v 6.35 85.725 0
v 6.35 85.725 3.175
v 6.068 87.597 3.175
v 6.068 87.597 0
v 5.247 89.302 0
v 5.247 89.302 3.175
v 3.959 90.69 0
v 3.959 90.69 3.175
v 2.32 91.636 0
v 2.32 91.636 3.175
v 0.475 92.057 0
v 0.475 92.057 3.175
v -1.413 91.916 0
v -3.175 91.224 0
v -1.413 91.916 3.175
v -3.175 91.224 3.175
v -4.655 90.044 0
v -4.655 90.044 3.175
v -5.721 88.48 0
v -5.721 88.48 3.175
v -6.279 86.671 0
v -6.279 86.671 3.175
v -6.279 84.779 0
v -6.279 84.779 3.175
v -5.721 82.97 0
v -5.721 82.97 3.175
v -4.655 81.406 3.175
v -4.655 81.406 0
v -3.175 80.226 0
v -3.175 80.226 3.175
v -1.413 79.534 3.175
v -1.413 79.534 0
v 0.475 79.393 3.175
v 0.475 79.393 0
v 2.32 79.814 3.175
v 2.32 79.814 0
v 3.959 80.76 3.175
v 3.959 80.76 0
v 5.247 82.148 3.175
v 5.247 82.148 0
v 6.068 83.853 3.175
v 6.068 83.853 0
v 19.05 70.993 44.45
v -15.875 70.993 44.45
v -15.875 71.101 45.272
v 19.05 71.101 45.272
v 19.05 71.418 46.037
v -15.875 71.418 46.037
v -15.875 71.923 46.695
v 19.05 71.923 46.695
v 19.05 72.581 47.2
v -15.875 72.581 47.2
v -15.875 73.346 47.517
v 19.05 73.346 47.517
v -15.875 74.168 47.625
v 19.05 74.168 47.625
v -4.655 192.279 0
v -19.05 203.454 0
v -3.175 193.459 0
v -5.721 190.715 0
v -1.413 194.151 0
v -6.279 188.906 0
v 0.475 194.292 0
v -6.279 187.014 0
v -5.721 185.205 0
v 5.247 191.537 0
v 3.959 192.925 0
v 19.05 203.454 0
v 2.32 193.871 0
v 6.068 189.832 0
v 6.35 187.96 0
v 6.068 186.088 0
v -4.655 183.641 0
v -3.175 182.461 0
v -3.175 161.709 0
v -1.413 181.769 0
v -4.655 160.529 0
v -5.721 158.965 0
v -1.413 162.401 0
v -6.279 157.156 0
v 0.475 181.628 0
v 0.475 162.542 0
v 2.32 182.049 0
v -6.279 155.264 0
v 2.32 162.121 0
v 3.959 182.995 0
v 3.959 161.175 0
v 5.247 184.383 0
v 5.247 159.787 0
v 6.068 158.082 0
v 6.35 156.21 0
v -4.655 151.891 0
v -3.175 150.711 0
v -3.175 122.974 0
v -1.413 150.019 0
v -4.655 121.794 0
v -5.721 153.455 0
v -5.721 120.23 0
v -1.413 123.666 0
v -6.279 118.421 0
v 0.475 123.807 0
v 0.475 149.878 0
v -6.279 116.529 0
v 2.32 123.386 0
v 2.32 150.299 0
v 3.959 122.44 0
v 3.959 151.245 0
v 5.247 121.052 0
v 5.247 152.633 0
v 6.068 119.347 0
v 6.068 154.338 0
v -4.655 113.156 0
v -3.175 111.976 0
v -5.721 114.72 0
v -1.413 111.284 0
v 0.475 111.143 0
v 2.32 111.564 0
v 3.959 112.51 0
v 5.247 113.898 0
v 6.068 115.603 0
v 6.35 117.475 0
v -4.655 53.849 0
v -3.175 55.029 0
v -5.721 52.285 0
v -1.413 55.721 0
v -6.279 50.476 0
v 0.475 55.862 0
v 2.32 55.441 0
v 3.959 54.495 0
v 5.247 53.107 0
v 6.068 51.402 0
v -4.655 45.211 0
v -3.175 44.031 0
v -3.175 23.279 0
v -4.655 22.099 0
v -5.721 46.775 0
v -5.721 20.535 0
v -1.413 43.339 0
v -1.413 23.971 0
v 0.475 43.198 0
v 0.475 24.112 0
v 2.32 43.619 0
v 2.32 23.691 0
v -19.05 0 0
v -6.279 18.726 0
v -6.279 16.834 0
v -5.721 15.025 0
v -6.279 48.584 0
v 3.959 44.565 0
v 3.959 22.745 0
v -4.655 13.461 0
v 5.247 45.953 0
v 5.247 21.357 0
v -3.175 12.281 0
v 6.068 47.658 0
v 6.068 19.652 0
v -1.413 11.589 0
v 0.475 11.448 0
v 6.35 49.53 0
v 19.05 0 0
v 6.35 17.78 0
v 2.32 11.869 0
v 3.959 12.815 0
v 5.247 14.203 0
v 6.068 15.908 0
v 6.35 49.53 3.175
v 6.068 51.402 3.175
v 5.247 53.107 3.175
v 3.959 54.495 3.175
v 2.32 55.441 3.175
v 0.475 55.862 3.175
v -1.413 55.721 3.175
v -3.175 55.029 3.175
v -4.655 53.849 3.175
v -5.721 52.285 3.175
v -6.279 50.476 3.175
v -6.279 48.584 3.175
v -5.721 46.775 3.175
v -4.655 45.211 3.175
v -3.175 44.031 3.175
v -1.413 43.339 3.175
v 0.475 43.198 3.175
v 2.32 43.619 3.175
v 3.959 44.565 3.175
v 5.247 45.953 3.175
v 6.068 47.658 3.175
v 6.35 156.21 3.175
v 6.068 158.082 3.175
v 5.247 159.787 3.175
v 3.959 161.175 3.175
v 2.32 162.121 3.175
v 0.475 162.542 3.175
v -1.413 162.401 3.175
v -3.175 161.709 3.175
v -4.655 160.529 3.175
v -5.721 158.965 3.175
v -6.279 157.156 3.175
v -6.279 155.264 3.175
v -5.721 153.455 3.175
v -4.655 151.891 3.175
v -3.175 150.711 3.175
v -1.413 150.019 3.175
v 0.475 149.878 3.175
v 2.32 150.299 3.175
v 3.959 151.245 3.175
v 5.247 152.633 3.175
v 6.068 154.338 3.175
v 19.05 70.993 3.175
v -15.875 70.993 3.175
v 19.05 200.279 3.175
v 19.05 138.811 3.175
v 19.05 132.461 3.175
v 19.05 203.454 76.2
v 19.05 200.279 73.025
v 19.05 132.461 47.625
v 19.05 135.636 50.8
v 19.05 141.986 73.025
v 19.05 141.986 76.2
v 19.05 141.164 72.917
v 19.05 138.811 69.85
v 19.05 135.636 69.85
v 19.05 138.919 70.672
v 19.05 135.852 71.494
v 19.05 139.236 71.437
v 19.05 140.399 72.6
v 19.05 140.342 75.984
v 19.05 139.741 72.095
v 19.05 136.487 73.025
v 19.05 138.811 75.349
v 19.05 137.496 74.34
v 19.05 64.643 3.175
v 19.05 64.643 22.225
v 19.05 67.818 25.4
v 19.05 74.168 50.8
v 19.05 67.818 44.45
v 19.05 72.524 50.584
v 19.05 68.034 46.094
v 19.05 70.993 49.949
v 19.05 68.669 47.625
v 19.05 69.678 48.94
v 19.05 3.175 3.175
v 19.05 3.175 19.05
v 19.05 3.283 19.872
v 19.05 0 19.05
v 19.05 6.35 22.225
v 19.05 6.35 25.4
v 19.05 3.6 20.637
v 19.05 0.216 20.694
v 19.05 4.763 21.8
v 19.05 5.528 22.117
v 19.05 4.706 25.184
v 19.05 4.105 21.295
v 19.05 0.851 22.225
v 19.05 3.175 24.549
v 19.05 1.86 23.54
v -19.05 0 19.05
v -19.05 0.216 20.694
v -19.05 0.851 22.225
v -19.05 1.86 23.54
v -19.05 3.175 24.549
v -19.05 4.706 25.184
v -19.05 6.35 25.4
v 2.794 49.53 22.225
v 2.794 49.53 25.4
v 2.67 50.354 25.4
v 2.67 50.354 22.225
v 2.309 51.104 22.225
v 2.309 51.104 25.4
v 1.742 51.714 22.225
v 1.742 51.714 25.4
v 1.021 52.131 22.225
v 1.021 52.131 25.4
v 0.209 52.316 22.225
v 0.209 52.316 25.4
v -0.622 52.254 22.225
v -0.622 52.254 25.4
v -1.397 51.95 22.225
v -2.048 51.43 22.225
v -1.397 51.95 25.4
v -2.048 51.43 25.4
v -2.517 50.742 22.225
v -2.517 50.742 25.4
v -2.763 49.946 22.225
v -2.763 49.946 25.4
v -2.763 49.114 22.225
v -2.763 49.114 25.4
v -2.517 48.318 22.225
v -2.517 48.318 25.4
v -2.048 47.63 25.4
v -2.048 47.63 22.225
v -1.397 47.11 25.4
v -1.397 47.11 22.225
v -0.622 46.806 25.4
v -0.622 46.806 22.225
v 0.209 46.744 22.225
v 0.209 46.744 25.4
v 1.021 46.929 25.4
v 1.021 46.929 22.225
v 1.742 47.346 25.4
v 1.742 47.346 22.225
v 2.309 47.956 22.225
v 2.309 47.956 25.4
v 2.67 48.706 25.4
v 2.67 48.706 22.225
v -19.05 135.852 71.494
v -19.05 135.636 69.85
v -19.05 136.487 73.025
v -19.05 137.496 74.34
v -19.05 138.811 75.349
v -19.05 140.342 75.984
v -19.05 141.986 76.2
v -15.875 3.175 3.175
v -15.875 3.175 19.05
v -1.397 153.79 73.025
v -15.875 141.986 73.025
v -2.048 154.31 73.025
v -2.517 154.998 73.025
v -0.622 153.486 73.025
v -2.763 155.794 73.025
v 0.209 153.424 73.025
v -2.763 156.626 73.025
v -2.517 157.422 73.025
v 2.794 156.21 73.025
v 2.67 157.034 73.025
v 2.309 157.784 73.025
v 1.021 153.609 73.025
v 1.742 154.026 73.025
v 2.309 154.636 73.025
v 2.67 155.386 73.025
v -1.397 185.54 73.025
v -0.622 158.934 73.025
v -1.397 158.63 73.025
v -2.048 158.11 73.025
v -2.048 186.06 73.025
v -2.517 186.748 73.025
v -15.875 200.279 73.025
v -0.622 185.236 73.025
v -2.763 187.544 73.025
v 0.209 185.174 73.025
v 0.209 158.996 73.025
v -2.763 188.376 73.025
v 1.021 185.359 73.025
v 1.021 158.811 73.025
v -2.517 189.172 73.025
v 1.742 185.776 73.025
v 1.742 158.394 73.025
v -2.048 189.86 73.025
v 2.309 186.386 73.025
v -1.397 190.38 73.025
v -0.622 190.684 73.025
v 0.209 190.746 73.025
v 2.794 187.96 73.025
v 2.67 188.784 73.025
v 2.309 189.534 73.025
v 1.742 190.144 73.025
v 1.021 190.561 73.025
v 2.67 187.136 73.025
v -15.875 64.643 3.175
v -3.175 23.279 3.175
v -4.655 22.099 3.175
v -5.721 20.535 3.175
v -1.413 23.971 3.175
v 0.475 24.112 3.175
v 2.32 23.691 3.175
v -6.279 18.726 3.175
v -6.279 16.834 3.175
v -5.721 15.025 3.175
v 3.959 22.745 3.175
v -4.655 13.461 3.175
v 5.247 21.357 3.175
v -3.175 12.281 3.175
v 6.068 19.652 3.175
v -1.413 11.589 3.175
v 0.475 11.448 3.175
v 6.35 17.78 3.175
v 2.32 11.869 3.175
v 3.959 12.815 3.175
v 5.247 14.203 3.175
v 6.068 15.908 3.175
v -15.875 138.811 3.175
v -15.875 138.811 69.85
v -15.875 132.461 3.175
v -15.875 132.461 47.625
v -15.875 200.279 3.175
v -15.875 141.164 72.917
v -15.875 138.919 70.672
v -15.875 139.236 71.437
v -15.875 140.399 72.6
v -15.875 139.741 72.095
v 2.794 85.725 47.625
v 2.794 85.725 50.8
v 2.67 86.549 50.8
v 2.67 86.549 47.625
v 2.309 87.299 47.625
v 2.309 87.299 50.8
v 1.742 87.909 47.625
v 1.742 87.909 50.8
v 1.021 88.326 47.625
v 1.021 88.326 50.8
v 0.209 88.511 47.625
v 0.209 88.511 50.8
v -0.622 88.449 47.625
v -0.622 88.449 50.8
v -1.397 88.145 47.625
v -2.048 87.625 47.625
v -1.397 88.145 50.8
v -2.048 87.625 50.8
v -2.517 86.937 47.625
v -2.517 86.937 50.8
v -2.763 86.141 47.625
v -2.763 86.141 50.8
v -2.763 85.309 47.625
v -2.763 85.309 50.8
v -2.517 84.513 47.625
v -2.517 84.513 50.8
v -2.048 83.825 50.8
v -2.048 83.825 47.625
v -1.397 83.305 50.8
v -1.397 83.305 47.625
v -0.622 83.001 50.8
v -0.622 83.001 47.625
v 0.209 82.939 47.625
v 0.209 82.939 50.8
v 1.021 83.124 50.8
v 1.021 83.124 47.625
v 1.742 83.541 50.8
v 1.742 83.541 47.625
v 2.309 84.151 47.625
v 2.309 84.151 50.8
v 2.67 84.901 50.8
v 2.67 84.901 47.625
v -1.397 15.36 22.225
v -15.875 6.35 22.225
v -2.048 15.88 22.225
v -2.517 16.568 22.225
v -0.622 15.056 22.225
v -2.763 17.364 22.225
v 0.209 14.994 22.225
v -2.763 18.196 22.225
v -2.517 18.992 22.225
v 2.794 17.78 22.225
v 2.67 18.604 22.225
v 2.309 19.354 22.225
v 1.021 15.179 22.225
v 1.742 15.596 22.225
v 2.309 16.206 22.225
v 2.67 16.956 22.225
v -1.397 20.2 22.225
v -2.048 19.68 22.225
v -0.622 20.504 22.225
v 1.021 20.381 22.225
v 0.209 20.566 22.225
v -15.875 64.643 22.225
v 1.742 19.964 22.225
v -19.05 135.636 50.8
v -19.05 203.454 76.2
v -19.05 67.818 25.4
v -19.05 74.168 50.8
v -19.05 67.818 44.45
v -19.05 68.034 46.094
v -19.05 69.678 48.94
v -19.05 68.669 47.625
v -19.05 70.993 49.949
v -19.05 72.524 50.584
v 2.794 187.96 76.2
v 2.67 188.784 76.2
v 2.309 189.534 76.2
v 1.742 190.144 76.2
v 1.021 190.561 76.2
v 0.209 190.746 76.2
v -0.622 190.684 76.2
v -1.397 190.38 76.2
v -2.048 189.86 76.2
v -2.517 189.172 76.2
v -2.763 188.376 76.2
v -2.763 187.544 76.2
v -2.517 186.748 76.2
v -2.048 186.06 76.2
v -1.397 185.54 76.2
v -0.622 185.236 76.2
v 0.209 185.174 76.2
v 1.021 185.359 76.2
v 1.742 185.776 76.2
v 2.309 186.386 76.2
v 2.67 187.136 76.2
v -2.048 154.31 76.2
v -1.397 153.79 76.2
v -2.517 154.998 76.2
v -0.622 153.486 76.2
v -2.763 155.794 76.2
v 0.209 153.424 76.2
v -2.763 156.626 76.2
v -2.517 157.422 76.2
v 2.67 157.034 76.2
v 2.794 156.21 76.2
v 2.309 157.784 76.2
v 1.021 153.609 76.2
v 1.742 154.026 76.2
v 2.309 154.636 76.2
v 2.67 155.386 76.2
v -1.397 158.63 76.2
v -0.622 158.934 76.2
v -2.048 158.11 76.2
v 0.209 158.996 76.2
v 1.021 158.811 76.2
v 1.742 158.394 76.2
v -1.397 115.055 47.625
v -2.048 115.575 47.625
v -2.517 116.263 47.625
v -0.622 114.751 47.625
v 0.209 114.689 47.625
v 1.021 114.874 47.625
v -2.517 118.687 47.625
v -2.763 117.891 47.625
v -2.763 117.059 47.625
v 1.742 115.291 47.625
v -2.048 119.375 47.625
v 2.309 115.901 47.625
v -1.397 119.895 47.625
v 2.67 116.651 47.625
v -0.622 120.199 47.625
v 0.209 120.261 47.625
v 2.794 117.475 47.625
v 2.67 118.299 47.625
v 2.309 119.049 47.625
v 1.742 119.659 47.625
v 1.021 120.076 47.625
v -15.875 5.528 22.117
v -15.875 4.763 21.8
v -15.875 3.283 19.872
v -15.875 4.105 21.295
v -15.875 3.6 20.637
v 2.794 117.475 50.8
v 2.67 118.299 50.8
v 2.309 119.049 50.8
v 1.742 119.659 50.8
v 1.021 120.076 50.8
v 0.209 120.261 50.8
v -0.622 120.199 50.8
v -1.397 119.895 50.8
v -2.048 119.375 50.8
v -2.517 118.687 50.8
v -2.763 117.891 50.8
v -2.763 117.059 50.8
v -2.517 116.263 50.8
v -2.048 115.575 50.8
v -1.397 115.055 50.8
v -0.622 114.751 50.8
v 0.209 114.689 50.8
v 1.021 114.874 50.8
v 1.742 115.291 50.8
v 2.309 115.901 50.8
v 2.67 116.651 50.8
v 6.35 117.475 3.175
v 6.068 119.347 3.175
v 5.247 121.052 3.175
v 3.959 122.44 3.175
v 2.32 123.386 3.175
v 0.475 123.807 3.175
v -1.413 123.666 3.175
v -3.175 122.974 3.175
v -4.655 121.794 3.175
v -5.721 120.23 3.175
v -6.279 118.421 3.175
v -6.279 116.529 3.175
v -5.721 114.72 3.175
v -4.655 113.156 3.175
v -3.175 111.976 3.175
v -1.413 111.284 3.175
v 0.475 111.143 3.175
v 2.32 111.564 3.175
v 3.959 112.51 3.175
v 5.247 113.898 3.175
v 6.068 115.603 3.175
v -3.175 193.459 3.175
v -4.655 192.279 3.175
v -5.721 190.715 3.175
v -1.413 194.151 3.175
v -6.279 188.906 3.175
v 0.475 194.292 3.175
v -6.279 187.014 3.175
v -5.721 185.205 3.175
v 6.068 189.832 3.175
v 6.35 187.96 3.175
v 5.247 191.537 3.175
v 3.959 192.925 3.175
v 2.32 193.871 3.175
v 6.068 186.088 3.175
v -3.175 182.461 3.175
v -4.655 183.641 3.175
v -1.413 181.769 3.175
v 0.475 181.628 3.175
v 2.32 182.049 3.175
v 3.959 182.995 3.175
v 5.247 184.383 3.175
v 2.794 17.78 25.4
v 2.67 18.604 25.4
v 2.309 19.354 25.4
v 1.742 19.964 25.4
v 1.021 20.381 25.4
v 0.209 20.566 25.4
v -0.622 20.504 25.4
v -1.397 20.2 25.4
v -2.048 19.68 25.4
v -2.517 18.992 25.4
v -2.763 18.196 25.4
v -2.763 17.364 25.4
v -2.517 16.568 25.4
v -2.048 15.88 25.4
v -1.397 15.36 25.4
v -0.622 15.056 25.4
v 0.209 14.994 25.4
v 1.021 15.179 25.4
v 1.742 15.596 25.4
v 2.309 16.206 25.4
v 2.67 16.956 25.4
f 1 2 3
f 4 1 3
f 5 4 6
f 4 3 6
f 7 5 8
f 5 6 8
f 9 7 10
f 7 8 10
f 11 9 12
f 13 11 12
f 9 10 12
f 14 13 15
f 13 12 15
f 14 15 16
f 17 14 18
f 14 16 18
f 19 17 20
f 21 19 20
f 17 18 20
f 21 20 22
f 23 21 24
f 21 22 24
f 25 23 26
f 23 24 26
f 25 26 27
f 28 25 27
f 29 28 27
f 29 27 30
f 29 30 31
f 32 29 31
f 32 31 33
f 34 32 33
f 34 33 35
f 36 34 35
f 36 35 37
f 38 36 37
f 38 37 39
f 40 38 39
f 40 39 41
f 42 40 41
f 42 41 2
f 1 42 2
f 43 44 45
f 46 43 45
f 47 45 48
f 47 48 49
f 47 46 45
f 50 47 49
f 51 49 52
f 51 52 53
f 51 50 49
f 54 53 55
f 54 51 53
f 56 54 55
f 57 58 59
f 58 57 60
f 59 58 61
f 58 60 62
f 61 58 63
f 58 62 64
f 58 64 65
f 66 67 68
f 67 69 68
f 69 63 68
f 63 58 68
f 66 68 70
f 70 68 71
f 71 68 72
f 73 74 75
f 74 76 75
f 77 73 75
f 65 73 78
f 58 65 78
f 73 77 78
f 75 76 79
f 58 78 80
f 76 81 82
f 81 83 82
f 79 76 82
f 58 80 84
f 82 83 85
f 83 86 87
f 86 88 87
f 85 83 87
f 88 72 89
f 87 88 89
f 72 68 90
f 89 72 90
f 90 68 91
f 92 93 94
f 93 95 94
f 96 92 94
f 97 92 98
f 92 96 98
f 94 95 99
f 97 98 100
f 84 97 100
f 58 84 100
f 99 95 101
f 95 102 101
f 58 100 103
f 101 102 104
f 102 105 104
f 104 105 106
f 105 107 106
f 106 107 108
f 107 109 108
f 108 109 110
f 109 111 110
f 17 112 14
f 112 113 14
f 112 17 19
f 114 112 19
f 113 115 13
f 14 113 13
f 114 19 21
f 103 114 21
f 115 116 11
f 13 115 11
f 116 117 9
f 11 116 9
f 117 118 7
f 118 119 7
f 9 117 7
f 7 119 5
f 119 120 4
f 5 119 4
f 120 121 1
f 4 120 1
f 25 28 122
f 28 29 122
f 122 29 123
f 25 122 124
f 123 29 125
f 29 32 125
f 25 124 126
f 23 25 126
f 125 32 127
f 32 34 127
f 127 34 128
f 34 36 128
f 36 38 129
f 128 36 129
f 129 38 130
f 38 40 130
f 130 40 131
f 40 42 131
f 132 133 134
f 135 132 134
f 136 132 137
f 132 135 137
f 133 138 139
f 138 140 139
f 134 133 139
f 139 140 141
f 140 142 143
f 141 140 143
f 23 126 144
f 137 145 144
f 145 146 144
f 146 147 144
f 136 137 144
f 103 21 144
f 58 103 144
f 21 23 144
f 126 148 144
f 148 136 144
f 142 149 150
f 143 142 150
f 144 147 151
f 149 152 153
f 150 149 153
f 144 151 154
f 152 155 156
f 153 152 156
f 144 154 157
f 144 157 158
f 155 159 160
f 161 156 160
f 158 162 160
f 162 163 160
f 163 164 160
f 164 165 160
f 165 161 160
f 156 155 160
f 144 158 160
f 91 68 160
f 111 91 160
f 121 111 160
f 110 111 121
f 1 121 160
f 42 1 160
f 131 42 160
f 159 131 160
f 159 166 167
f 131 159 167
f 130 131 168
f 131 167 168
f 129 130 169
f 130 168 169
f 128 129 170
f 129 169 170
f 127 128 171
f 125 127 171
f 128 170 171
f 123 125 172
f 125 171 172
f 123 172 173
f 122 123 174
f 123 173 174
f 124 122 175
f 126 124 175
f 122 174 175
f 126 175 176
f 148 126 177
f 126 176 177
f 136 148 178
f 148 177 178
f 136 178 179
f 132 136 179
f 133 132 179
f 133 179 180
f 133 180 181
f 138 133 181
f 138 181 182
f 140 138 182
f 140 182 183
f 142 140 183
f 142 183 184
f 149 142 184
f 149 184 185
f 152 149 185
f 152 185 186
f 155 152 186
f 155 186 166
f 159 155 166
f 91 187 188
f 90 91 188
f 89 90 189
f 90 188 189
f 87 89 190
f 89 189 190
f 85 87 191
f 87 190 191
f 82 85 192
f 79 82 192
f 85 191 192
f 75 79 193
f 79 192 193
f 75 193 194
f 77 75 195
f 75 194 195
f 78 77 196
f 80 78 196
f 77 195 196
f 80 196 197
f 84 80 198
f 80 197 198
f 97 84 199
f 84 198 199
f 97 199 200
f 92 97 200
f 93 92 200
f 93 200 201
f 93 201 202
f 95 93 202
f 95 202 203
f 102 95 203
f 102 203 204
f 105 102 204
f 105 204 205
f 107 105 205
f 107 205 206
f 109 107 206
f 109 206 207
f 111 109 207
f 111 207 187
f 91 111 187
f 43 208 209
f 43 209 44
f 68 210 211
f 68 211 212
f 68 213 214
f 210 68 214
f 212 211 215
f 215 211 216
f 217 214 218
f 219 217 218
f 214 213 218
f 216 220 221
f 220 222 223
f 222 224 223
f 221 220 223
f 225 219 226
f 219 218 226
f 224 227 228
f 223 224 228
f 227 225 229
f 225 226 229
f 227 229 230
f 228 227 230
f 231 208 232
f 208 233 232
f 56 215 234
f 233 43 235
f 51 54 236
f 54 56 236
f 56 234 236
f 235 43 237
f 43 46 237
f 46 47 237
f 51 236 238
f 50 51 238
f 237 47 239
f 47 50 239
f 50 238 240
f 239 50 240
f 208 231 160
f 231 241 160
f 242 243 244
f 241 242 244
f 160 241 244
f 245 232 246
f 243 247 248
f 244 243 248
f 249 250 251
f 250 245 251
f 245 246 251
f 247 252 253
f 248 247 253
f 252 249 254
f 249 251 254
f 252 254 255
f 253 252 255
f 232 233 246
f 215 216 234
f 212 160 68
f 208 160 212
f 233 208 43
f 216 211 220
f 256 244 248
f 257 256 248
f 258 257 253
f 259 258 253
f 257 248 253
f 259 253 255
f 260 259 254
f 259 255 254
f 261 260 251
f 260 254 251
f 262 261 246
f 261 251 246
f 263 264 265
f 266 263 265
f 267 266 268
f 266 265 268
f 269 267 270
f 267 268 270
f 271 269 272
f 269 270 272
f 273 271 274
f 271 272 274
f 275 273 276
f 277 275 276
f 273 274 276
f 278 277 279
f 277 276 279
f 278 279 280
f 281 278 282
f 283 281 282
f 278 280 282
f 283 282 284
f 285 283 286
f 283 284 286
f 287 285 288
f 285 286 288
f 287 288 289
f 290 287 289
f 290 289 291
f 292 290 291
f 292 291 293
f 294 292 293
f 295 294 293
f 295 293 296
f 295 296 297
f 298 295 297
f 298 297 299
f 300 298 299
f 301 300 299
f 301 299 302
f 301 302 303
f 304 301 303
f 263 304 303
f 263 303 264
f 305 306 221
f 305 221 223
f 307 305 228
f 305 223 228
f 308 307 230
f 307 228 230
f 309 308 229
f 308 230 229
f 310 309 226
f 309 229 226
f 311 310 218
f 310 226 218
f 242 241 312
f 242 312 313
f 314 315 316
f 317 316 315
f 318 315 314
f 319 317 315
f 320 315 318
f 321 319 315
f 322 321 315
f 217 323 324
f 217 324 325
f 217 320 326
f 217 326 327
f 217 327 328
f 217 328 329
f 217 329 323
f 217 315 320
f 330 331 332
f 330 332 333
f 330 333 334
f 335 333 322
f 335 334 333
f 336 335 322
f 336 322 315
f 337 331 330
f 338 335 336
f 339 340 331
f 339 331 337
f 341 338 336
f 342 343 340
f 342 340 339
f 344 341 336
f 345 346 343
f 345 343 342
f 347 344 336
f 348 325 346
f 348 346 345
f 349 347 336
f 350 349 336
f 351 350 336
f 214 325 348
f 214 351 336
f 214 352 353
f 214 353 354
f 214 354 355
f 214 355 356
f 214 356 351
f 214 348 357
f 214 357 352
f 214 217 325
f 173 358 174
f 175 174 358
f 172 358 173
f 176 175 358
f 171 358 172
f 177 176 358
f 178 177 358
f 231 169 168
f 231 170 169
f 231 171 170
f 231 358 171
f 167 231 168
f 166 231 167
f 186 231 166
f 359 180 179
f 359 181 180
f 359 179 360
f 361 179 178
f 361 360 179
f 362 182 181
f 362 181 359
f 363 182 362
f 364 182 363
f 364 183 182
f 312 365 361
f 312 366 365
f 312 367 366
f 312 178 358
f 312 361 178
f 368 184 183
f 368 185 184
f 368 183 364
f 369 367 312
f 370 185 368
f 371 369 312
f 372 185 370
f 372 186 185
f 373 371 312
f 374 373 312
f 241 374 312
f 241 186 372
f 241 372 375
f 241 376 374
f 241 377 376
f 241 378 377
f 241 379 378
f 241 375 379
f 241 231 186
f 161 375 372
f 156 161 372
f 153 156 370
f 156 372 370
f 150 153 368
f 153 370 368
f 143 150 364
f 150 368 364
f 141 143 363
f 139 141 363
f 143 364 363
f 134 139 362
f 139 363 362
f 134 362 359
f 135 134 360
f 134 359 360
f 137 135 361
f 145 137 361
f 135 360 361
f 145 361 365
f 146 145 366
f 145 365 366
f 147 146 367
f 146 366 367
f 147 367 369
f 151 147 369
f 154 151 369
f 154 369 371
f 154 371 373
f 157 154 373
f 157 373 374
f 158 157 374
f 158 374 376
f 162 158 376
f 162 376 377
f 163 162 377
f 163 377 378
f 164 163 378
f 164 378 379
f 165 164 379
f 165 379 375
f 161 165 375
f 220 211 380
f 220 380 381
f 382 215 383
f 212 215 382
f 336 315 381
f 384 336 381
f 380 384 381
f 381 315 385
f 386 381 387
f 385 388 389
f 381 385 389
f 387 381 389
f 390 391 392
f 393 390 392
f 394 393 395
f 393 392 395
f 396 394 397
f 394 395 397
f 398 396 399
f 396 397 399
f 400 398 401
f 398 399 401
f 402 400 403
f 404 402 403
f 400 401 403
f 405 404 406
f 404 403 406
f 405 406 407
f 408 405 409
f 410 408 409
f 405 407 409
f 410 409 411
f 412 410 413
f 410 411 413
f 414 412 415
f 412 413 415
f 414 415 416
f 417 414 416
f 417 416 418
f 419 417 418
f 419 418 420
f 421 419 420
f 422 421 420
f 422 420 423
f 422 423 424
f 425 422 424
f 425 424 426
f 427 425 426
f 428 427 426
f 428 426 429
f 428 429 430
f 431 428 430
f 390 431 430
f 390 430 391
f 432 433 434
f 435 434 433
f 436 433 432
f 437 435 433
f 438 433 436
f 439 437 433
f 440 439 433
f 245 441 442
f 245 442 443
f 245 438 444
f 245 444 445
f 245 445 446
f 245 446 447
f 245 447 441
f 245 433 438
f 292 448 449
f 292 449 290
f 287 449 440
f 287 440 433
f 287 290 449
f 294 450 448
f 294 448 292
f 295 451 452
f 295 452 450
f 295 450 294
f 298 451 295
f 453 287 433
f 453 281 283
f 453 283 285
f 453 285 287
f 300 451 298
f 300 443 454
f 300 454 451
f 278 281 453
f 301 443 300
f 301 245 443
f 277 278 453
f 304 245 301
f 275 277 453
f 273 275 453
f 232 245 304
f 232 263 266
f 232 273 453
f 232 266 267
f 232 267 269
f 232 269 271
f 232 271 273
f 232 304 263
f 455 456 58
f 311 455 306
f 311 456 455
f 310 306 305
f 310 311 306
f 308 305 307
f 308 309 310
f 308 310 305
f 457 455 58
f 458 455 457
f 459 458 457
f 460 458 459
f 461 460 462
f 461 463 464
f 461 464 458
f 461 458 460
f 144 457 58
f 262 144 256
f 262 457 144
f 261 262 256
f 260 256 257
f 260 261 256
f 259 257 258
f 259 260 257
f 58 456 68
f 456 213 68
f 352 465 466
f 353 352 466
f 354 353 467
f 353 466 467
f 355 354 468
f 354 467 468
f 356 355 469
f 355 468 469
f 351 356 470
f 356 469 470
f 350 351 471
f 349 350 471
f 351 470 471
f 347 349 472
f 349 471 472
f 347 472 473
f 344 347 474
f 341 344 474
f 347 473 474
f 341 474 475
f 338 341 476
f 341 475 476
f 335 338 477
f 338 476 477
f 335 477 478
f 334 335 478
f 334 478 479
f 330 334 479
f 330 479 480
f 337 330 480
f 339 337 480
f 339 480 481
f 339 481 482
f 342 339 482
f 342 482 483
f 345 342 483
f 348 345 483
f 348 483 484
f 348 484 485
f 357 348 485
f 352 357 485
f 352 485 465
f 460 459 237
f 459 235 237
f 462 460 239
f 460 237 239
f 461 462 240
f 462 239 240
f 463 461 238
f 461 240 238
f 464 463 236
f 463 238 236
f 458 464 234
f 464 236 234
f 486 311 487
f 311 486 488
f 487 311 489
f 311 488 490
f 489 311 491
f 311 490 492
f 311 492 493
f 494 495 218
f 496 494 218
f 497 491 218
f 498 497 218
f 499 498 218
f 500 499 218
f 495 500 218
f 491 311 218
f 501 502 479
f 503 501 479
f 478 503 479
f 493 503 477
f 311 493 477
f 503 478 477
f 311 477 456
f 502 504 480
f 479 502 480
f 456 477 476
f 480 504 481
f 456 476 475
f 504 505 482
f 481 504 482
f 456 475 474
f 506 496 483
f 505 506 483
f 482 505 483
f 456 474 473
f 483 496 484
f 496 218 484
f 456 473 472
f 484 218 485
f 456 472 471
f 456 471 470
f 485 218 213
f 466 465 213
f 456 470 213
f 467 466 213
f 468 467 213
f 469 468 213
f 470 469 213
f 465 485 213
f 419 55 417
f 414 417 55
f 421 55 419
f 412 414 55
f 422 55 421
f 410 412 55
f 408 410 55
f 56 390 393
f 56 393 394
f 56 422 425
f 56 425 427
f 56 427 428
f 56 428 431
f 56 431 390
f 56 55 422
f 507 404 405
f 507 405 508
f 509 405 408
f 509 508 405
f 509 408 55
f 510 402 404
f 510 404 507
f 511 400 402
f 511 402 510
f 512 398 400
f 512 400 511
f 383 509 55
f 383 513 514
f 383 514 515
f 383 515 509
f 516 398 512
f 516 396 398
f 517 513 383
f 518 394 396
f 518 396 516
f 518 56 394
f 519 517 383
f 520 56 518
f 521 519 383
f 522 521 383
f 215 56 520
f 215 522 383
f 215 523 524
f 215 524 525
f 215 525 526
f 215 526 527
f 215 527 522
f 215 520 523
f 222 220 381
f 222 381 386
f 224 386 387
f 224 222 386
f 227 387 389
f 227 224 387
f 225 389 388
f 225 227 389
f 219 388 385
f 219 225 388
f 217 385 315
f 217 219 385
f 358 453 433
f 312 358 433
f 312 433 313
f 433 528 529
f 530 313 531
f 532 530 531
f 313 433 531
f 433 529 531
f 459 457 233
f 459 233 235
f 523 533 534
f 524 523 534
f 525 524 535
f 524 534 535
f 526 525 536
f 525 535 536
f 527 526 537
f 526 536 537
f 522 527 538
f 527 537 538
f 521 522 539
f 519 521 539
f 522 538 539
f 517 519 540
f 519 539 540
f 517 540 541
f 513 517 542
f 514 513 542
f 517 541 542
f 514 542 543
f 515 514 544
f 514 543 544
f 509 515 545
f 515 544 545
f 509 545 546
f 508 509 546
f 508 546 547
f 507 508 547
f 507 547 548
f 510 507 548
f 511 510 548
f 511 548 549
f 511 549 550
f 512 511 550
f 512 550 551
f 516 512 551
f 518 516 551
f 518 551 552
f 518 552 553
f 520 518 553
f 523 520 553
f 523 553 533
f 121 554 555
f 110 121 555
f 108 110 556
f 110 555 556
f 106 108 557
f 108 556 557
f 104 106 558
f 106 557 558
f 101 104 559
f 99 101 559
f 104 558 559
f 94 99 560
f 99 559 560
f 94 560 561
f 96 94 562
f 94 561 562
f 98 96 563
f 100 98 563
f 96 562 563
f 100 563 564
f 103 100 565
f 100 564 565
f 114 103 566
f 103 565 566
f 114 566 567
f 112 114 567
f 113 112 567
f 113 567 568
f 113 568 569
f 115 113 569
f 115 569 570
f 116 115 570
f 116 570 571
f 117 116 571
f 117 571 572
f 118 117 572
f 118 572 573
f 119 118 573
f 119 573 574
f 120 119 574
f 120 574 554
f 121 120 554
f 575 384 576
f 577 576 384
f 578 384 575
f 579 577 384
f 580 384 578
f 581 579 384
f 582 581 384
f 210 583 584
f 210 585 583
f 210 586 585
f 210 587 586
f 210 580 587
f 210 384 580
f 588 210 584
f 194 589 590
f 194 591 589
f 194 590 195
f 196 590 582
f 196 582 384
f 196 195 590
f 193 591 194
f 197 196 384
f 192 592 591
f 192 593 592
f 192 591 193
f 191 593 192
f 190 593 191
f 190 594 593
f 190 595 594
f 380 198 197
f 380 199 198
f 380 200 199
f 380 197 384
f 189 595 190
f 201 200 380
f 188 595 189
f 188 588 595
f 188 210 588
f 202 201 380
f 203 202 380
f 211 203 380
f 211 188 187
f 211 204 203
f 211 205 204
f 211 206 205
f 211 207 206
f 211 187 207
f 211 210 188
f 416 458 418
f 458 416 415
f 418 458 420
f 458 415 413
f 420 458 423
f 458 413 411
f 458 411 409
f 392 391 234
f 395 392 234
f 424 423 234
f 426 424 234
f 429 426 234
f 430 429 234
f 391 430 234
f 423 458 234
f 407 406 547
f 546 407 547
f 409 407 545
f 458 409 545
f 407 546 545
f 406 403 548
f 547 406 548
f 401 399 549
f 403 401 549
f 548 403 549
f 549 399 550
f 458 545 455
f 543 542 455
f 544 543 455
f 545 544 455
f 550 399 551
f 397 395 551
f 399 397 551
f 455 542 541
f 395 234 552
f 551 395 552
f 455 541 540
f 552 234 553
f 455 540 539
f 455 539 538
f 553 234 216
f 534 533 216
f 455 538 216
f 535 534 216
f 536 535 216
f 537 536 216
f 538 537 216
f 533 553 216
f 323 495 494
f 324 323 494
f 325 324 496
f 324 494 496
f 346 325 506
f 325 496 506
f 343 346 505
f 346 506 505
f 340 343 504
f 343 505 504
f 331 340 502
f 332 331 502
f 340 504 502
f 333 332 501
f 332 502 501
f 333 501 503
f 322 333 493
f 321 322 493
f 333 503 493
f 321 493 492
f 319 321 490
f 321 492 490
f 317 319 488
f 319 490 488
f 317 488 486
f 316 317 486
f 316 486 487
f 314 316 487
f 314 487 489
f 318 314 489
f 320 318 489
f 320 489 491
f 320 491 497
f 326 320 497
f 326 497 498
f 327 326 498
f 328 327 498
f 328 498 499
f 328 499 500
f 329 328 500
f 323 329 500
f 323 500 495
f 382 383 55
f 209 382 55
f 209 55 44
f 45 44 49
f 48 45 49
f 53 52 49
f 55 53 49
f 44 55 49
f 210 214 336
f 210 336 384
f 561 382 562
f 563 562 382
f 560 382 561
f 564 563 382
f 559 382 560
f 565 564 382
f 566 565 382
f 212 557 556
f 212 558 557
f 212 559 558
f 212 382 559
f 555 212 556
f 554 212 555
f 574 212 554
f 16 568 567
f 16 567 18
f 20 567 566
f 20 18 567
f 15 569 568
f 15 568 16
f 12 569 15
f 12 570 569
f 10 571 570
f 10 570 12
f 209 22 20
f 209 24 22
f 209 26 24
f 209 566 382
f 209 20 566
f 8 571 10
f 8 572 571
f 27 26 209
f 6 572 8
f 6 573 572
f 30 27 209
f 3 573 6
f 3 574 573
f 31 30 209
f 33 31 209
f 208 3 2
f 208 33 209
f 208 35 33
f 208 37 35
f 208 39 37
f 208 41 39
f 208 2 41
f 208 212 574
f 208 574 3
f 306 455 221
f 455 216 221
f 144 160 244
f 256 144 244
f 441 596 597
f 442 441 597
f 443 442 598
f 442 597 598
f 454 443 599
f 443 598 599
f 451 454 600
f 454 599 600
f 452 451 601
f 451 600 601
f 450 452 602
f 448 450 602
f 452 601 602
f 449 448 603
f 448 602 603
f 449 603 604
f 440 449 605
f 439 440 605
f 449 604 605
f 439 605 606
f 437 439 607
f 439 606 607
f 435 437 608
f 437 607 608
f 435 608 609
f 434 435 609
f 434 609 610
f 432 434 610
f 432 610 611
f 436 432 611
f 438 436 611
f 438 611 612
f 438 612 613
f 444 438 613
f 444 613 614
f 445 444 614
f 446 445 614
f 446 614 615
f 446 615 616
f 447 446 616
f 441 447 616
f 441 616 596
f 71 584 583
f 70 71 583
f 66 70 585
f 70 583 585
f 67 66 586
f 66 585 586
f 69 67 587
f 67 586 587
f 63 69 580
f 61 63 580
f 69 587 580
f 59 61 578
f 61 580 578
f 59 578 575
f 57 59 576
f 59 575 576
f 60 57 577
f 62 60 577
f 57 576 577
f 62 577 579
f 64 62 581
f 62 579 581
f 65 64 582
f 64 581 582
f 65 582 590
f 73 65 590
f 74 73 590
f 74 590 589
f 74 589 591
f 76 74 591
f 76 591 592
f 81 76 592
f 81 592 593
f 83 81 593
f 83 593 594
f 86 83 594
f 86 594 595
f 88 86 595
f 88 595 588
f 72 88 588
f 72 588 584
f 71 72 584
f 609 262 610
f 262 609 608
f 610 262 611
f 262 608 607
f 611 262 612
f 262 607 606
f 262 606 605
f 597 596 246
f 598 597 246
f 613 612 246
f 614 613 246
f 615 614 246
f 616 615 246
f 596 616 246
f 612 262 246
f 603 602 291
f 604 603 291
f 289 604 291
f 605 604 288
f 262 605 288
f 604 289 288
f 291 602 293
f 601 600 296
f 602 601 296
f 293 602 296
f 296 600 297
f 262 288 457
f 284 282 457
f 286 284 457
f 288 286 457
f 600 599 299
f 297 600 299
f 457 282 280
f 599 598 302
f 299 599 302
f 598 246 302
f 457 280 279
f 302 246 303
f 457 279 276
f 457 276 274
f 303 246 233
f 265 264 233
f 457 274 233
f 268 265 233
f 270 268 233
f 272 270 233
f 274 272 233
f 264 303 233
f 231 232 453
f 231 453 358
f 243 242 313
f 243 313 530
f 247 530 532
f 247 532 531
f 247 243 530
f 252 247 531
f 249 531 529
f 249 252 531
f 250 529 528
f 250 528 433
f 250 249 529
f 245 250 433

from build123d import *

# Parameters (mm, degrees)
BOSS_EXTRUDE1_DEPTH     = 19.05
CUT_EXTRUDE1_DEPTH      = 1
CUT_EXTRUDE1_DEPTH_BACK = 34.925
SKETCH4_R               = 2.794
CUT_EXTRUDE2_DEPTH      = 51.8
CUT_EXTRUDE2_DEPTH_BACK = 26.4
SKETCH5_R               = 2.794
CUT_EXTRUDE3_DEPTH      = 26.4
CUT_EXTRUDE3_DEPTH_BACK = 51.8
SKETCH6_R               = 2.794
CUT_EXTRUDE4_DEPTH      = 1
CUT_EXTRUDE4_DEPTH_BACK = 77.2
SKETCH7_R               = 6.35
CUT_EXTRUDE6_DEPTH      = 34.925


with BuildPart() as part:
    # Sketch1 → Boss-Extrude1 (new body, symmetric)
    with BuildSketch(Plane.YZ):
        with BuildLine():
            Line((6.35, 25.4), (67.818, 25.4))
            Line((67.818, 25.4), (67.818, 44.45))
            ThreePointArc((67.818, 44.45), (69.677871939, 48.940128061), (74.168, 50.8))
            Line((74.168, 50.8), (135.636, 50.8))
            Line((135.636, 50.8), (135.636, 69.85))
            ThreePointArc((135.636, 69.85), (137.495871939, 74.340128061), (141.986, 76.2))
            Line((141.986, 76.2), (203.454, 76.2))
            Line((203.454, 76.2), (203.454, 0))
            Line((203.454, 0), (112.272540658, 0))
            Line((112.272540658, 0), (108.743815039, 0))
            Line((108.743815039, 0), (0, 0))
            Line((0, 0), (0, 19.05))
            ThreePointArc((0, 19.05), (1.859871939, 23.540128061), (6.35, 25.4))
        make_face()
    extrude(amount=BOSS_EXTRUDE1_DEPTH, both=True)

    # Sketch2 → Cut-Extrude1 (cut, two sides)
    with BuildSketch(Plane.YZ.offset(19.05)) as cut_extrude1_sk:
        with BuildLine():
            Line((6.35, 22.225), (64.643, 22.225))
            Line((64.643, 22.225), (64.643, 3.175))
            Line((64.643, 3.175), (3.175, 3.175))
            Line((3.175, 3.175), (3.175, 19.05))
            ThreePointArc((3.175, 19.05), (4.10493597, 21.29506403), (6.35, 22.225))
        make_face()
        with BuildLine():
            Line((74.168, 47.625), (132.461, 47.625))
            Line((132.461, 47.625), (132.461, 3.175))
            Line((132.461, 3.175), (70.993, 3.175))
            Line((70.993, 3.175), (70.993, 44.45))
            ThreePointArc((70.993, 44.45), (71.92293597, 46.69506403), (74.168, 47.625))
        make_face()
        with BuildLine():
            Line((141.986, 73.025), (200.279, 73.025))
            Line((200.279, 73.025), (200.279, 3.175))
            Line((200.279, 3.175), (138.811, 3.175))
            Line((138.811, 3.175), (138.811, 69.85))
            ThreePointArc((138.811, 69.85), (139.74093597, 72.09506403), (141.986, 73.025))
        make_face()
    extrude(amount=CUT_EXTRUDE1_DEPTH, mode=Mode.SUBTRACT)
    extrude(cut_extrude1_sk.sketch, amount=-CUT_EXTRUDE1_DEPTH_BACK, mode=Mode.SUBTRACT)

    # Sketch4 → Cut-Extrude2 (cut, two sides)
    with BuildSketch(Plane.XY.offset(25.4)) as cut_extrude2_sk:
        with Locations((0, 17.78)):
            Circle(SKETCH4_R)
        with Locations((0, 49.53)):
            Circle(SKETCH4_R)
    extrude(amount=CUT_EXTRUDE2_DEPTH, mode=Mode.SUBTRACT)
    extrude(cut_extrude2_sk.sketch, amount=-CUT_EXTRUDE2_DEPTH_BACK, mode=Mode.SUBTRACT)

    # Sketch5 → Cut-Extrude3 (cut, two sides)
    with BuildSketch(Plane.XY.offset(50.8)) as cut_extrude3_sk:
        with Locations((0, 85.725)):
            Circle(SKETCH5_R)
        with Locations((0, 117.475)):
            Circle(SKETCH5_R)
    extrude(amount=CUT_EXTRUDE3_DEPTH, mode=Mode.SUBTRACT)
    extrude(cut_extrude3_sk.sketch, amount=-CUT_EXTRUDE3_DEPTH_BACK, mode=Mode.SUBTRACT)

    # Sketch6 → Cut-Extrude4 (cut, two sides)
    with BuildSketch(Plane.XY.offset(76.2)) as cut_extrude4_sk:
        with Locations((0, 156.21)):
            Circle(SKETCH6_R)
        with Locations((0, 187.96)):
            Circle(SKETCH6_R)
    extrude(amount=CUT_EXTRUDE4_DEPTH, mode=Mode.SUBTRACT)
    extrude(cut_extrude4_sk.sketch, amount=-CUT_EXTRUDE4_DEPTH_BACK, mode=Mode.SUBTRACT)

    # Sketch7 → Cut-Extrude6 (cut)
    with BuildSketch(Plane.XY.offset(3.175)):
        with Locations((0, 17.78)):
            Circle(SKETCH7_R)
        with Locations((0, 49.53)):
            Circle(SKETCH7_R)
        with Locations((0, 85.725)):
            Circle(SKETCH7_R)
        with Locations((0, 117.475)):
            Circle(SKETCH7_R)
        with Locations((0, 156.21)):
            Circle(SKETCH7_R)
        with Locations((0, 187.96)):
            Circle(SKETCH7_R)
    extrude(amount=-CUT_EXTRUDE6_DEPTH, mode=Mode.SUBTRACT)


solid = part.part
